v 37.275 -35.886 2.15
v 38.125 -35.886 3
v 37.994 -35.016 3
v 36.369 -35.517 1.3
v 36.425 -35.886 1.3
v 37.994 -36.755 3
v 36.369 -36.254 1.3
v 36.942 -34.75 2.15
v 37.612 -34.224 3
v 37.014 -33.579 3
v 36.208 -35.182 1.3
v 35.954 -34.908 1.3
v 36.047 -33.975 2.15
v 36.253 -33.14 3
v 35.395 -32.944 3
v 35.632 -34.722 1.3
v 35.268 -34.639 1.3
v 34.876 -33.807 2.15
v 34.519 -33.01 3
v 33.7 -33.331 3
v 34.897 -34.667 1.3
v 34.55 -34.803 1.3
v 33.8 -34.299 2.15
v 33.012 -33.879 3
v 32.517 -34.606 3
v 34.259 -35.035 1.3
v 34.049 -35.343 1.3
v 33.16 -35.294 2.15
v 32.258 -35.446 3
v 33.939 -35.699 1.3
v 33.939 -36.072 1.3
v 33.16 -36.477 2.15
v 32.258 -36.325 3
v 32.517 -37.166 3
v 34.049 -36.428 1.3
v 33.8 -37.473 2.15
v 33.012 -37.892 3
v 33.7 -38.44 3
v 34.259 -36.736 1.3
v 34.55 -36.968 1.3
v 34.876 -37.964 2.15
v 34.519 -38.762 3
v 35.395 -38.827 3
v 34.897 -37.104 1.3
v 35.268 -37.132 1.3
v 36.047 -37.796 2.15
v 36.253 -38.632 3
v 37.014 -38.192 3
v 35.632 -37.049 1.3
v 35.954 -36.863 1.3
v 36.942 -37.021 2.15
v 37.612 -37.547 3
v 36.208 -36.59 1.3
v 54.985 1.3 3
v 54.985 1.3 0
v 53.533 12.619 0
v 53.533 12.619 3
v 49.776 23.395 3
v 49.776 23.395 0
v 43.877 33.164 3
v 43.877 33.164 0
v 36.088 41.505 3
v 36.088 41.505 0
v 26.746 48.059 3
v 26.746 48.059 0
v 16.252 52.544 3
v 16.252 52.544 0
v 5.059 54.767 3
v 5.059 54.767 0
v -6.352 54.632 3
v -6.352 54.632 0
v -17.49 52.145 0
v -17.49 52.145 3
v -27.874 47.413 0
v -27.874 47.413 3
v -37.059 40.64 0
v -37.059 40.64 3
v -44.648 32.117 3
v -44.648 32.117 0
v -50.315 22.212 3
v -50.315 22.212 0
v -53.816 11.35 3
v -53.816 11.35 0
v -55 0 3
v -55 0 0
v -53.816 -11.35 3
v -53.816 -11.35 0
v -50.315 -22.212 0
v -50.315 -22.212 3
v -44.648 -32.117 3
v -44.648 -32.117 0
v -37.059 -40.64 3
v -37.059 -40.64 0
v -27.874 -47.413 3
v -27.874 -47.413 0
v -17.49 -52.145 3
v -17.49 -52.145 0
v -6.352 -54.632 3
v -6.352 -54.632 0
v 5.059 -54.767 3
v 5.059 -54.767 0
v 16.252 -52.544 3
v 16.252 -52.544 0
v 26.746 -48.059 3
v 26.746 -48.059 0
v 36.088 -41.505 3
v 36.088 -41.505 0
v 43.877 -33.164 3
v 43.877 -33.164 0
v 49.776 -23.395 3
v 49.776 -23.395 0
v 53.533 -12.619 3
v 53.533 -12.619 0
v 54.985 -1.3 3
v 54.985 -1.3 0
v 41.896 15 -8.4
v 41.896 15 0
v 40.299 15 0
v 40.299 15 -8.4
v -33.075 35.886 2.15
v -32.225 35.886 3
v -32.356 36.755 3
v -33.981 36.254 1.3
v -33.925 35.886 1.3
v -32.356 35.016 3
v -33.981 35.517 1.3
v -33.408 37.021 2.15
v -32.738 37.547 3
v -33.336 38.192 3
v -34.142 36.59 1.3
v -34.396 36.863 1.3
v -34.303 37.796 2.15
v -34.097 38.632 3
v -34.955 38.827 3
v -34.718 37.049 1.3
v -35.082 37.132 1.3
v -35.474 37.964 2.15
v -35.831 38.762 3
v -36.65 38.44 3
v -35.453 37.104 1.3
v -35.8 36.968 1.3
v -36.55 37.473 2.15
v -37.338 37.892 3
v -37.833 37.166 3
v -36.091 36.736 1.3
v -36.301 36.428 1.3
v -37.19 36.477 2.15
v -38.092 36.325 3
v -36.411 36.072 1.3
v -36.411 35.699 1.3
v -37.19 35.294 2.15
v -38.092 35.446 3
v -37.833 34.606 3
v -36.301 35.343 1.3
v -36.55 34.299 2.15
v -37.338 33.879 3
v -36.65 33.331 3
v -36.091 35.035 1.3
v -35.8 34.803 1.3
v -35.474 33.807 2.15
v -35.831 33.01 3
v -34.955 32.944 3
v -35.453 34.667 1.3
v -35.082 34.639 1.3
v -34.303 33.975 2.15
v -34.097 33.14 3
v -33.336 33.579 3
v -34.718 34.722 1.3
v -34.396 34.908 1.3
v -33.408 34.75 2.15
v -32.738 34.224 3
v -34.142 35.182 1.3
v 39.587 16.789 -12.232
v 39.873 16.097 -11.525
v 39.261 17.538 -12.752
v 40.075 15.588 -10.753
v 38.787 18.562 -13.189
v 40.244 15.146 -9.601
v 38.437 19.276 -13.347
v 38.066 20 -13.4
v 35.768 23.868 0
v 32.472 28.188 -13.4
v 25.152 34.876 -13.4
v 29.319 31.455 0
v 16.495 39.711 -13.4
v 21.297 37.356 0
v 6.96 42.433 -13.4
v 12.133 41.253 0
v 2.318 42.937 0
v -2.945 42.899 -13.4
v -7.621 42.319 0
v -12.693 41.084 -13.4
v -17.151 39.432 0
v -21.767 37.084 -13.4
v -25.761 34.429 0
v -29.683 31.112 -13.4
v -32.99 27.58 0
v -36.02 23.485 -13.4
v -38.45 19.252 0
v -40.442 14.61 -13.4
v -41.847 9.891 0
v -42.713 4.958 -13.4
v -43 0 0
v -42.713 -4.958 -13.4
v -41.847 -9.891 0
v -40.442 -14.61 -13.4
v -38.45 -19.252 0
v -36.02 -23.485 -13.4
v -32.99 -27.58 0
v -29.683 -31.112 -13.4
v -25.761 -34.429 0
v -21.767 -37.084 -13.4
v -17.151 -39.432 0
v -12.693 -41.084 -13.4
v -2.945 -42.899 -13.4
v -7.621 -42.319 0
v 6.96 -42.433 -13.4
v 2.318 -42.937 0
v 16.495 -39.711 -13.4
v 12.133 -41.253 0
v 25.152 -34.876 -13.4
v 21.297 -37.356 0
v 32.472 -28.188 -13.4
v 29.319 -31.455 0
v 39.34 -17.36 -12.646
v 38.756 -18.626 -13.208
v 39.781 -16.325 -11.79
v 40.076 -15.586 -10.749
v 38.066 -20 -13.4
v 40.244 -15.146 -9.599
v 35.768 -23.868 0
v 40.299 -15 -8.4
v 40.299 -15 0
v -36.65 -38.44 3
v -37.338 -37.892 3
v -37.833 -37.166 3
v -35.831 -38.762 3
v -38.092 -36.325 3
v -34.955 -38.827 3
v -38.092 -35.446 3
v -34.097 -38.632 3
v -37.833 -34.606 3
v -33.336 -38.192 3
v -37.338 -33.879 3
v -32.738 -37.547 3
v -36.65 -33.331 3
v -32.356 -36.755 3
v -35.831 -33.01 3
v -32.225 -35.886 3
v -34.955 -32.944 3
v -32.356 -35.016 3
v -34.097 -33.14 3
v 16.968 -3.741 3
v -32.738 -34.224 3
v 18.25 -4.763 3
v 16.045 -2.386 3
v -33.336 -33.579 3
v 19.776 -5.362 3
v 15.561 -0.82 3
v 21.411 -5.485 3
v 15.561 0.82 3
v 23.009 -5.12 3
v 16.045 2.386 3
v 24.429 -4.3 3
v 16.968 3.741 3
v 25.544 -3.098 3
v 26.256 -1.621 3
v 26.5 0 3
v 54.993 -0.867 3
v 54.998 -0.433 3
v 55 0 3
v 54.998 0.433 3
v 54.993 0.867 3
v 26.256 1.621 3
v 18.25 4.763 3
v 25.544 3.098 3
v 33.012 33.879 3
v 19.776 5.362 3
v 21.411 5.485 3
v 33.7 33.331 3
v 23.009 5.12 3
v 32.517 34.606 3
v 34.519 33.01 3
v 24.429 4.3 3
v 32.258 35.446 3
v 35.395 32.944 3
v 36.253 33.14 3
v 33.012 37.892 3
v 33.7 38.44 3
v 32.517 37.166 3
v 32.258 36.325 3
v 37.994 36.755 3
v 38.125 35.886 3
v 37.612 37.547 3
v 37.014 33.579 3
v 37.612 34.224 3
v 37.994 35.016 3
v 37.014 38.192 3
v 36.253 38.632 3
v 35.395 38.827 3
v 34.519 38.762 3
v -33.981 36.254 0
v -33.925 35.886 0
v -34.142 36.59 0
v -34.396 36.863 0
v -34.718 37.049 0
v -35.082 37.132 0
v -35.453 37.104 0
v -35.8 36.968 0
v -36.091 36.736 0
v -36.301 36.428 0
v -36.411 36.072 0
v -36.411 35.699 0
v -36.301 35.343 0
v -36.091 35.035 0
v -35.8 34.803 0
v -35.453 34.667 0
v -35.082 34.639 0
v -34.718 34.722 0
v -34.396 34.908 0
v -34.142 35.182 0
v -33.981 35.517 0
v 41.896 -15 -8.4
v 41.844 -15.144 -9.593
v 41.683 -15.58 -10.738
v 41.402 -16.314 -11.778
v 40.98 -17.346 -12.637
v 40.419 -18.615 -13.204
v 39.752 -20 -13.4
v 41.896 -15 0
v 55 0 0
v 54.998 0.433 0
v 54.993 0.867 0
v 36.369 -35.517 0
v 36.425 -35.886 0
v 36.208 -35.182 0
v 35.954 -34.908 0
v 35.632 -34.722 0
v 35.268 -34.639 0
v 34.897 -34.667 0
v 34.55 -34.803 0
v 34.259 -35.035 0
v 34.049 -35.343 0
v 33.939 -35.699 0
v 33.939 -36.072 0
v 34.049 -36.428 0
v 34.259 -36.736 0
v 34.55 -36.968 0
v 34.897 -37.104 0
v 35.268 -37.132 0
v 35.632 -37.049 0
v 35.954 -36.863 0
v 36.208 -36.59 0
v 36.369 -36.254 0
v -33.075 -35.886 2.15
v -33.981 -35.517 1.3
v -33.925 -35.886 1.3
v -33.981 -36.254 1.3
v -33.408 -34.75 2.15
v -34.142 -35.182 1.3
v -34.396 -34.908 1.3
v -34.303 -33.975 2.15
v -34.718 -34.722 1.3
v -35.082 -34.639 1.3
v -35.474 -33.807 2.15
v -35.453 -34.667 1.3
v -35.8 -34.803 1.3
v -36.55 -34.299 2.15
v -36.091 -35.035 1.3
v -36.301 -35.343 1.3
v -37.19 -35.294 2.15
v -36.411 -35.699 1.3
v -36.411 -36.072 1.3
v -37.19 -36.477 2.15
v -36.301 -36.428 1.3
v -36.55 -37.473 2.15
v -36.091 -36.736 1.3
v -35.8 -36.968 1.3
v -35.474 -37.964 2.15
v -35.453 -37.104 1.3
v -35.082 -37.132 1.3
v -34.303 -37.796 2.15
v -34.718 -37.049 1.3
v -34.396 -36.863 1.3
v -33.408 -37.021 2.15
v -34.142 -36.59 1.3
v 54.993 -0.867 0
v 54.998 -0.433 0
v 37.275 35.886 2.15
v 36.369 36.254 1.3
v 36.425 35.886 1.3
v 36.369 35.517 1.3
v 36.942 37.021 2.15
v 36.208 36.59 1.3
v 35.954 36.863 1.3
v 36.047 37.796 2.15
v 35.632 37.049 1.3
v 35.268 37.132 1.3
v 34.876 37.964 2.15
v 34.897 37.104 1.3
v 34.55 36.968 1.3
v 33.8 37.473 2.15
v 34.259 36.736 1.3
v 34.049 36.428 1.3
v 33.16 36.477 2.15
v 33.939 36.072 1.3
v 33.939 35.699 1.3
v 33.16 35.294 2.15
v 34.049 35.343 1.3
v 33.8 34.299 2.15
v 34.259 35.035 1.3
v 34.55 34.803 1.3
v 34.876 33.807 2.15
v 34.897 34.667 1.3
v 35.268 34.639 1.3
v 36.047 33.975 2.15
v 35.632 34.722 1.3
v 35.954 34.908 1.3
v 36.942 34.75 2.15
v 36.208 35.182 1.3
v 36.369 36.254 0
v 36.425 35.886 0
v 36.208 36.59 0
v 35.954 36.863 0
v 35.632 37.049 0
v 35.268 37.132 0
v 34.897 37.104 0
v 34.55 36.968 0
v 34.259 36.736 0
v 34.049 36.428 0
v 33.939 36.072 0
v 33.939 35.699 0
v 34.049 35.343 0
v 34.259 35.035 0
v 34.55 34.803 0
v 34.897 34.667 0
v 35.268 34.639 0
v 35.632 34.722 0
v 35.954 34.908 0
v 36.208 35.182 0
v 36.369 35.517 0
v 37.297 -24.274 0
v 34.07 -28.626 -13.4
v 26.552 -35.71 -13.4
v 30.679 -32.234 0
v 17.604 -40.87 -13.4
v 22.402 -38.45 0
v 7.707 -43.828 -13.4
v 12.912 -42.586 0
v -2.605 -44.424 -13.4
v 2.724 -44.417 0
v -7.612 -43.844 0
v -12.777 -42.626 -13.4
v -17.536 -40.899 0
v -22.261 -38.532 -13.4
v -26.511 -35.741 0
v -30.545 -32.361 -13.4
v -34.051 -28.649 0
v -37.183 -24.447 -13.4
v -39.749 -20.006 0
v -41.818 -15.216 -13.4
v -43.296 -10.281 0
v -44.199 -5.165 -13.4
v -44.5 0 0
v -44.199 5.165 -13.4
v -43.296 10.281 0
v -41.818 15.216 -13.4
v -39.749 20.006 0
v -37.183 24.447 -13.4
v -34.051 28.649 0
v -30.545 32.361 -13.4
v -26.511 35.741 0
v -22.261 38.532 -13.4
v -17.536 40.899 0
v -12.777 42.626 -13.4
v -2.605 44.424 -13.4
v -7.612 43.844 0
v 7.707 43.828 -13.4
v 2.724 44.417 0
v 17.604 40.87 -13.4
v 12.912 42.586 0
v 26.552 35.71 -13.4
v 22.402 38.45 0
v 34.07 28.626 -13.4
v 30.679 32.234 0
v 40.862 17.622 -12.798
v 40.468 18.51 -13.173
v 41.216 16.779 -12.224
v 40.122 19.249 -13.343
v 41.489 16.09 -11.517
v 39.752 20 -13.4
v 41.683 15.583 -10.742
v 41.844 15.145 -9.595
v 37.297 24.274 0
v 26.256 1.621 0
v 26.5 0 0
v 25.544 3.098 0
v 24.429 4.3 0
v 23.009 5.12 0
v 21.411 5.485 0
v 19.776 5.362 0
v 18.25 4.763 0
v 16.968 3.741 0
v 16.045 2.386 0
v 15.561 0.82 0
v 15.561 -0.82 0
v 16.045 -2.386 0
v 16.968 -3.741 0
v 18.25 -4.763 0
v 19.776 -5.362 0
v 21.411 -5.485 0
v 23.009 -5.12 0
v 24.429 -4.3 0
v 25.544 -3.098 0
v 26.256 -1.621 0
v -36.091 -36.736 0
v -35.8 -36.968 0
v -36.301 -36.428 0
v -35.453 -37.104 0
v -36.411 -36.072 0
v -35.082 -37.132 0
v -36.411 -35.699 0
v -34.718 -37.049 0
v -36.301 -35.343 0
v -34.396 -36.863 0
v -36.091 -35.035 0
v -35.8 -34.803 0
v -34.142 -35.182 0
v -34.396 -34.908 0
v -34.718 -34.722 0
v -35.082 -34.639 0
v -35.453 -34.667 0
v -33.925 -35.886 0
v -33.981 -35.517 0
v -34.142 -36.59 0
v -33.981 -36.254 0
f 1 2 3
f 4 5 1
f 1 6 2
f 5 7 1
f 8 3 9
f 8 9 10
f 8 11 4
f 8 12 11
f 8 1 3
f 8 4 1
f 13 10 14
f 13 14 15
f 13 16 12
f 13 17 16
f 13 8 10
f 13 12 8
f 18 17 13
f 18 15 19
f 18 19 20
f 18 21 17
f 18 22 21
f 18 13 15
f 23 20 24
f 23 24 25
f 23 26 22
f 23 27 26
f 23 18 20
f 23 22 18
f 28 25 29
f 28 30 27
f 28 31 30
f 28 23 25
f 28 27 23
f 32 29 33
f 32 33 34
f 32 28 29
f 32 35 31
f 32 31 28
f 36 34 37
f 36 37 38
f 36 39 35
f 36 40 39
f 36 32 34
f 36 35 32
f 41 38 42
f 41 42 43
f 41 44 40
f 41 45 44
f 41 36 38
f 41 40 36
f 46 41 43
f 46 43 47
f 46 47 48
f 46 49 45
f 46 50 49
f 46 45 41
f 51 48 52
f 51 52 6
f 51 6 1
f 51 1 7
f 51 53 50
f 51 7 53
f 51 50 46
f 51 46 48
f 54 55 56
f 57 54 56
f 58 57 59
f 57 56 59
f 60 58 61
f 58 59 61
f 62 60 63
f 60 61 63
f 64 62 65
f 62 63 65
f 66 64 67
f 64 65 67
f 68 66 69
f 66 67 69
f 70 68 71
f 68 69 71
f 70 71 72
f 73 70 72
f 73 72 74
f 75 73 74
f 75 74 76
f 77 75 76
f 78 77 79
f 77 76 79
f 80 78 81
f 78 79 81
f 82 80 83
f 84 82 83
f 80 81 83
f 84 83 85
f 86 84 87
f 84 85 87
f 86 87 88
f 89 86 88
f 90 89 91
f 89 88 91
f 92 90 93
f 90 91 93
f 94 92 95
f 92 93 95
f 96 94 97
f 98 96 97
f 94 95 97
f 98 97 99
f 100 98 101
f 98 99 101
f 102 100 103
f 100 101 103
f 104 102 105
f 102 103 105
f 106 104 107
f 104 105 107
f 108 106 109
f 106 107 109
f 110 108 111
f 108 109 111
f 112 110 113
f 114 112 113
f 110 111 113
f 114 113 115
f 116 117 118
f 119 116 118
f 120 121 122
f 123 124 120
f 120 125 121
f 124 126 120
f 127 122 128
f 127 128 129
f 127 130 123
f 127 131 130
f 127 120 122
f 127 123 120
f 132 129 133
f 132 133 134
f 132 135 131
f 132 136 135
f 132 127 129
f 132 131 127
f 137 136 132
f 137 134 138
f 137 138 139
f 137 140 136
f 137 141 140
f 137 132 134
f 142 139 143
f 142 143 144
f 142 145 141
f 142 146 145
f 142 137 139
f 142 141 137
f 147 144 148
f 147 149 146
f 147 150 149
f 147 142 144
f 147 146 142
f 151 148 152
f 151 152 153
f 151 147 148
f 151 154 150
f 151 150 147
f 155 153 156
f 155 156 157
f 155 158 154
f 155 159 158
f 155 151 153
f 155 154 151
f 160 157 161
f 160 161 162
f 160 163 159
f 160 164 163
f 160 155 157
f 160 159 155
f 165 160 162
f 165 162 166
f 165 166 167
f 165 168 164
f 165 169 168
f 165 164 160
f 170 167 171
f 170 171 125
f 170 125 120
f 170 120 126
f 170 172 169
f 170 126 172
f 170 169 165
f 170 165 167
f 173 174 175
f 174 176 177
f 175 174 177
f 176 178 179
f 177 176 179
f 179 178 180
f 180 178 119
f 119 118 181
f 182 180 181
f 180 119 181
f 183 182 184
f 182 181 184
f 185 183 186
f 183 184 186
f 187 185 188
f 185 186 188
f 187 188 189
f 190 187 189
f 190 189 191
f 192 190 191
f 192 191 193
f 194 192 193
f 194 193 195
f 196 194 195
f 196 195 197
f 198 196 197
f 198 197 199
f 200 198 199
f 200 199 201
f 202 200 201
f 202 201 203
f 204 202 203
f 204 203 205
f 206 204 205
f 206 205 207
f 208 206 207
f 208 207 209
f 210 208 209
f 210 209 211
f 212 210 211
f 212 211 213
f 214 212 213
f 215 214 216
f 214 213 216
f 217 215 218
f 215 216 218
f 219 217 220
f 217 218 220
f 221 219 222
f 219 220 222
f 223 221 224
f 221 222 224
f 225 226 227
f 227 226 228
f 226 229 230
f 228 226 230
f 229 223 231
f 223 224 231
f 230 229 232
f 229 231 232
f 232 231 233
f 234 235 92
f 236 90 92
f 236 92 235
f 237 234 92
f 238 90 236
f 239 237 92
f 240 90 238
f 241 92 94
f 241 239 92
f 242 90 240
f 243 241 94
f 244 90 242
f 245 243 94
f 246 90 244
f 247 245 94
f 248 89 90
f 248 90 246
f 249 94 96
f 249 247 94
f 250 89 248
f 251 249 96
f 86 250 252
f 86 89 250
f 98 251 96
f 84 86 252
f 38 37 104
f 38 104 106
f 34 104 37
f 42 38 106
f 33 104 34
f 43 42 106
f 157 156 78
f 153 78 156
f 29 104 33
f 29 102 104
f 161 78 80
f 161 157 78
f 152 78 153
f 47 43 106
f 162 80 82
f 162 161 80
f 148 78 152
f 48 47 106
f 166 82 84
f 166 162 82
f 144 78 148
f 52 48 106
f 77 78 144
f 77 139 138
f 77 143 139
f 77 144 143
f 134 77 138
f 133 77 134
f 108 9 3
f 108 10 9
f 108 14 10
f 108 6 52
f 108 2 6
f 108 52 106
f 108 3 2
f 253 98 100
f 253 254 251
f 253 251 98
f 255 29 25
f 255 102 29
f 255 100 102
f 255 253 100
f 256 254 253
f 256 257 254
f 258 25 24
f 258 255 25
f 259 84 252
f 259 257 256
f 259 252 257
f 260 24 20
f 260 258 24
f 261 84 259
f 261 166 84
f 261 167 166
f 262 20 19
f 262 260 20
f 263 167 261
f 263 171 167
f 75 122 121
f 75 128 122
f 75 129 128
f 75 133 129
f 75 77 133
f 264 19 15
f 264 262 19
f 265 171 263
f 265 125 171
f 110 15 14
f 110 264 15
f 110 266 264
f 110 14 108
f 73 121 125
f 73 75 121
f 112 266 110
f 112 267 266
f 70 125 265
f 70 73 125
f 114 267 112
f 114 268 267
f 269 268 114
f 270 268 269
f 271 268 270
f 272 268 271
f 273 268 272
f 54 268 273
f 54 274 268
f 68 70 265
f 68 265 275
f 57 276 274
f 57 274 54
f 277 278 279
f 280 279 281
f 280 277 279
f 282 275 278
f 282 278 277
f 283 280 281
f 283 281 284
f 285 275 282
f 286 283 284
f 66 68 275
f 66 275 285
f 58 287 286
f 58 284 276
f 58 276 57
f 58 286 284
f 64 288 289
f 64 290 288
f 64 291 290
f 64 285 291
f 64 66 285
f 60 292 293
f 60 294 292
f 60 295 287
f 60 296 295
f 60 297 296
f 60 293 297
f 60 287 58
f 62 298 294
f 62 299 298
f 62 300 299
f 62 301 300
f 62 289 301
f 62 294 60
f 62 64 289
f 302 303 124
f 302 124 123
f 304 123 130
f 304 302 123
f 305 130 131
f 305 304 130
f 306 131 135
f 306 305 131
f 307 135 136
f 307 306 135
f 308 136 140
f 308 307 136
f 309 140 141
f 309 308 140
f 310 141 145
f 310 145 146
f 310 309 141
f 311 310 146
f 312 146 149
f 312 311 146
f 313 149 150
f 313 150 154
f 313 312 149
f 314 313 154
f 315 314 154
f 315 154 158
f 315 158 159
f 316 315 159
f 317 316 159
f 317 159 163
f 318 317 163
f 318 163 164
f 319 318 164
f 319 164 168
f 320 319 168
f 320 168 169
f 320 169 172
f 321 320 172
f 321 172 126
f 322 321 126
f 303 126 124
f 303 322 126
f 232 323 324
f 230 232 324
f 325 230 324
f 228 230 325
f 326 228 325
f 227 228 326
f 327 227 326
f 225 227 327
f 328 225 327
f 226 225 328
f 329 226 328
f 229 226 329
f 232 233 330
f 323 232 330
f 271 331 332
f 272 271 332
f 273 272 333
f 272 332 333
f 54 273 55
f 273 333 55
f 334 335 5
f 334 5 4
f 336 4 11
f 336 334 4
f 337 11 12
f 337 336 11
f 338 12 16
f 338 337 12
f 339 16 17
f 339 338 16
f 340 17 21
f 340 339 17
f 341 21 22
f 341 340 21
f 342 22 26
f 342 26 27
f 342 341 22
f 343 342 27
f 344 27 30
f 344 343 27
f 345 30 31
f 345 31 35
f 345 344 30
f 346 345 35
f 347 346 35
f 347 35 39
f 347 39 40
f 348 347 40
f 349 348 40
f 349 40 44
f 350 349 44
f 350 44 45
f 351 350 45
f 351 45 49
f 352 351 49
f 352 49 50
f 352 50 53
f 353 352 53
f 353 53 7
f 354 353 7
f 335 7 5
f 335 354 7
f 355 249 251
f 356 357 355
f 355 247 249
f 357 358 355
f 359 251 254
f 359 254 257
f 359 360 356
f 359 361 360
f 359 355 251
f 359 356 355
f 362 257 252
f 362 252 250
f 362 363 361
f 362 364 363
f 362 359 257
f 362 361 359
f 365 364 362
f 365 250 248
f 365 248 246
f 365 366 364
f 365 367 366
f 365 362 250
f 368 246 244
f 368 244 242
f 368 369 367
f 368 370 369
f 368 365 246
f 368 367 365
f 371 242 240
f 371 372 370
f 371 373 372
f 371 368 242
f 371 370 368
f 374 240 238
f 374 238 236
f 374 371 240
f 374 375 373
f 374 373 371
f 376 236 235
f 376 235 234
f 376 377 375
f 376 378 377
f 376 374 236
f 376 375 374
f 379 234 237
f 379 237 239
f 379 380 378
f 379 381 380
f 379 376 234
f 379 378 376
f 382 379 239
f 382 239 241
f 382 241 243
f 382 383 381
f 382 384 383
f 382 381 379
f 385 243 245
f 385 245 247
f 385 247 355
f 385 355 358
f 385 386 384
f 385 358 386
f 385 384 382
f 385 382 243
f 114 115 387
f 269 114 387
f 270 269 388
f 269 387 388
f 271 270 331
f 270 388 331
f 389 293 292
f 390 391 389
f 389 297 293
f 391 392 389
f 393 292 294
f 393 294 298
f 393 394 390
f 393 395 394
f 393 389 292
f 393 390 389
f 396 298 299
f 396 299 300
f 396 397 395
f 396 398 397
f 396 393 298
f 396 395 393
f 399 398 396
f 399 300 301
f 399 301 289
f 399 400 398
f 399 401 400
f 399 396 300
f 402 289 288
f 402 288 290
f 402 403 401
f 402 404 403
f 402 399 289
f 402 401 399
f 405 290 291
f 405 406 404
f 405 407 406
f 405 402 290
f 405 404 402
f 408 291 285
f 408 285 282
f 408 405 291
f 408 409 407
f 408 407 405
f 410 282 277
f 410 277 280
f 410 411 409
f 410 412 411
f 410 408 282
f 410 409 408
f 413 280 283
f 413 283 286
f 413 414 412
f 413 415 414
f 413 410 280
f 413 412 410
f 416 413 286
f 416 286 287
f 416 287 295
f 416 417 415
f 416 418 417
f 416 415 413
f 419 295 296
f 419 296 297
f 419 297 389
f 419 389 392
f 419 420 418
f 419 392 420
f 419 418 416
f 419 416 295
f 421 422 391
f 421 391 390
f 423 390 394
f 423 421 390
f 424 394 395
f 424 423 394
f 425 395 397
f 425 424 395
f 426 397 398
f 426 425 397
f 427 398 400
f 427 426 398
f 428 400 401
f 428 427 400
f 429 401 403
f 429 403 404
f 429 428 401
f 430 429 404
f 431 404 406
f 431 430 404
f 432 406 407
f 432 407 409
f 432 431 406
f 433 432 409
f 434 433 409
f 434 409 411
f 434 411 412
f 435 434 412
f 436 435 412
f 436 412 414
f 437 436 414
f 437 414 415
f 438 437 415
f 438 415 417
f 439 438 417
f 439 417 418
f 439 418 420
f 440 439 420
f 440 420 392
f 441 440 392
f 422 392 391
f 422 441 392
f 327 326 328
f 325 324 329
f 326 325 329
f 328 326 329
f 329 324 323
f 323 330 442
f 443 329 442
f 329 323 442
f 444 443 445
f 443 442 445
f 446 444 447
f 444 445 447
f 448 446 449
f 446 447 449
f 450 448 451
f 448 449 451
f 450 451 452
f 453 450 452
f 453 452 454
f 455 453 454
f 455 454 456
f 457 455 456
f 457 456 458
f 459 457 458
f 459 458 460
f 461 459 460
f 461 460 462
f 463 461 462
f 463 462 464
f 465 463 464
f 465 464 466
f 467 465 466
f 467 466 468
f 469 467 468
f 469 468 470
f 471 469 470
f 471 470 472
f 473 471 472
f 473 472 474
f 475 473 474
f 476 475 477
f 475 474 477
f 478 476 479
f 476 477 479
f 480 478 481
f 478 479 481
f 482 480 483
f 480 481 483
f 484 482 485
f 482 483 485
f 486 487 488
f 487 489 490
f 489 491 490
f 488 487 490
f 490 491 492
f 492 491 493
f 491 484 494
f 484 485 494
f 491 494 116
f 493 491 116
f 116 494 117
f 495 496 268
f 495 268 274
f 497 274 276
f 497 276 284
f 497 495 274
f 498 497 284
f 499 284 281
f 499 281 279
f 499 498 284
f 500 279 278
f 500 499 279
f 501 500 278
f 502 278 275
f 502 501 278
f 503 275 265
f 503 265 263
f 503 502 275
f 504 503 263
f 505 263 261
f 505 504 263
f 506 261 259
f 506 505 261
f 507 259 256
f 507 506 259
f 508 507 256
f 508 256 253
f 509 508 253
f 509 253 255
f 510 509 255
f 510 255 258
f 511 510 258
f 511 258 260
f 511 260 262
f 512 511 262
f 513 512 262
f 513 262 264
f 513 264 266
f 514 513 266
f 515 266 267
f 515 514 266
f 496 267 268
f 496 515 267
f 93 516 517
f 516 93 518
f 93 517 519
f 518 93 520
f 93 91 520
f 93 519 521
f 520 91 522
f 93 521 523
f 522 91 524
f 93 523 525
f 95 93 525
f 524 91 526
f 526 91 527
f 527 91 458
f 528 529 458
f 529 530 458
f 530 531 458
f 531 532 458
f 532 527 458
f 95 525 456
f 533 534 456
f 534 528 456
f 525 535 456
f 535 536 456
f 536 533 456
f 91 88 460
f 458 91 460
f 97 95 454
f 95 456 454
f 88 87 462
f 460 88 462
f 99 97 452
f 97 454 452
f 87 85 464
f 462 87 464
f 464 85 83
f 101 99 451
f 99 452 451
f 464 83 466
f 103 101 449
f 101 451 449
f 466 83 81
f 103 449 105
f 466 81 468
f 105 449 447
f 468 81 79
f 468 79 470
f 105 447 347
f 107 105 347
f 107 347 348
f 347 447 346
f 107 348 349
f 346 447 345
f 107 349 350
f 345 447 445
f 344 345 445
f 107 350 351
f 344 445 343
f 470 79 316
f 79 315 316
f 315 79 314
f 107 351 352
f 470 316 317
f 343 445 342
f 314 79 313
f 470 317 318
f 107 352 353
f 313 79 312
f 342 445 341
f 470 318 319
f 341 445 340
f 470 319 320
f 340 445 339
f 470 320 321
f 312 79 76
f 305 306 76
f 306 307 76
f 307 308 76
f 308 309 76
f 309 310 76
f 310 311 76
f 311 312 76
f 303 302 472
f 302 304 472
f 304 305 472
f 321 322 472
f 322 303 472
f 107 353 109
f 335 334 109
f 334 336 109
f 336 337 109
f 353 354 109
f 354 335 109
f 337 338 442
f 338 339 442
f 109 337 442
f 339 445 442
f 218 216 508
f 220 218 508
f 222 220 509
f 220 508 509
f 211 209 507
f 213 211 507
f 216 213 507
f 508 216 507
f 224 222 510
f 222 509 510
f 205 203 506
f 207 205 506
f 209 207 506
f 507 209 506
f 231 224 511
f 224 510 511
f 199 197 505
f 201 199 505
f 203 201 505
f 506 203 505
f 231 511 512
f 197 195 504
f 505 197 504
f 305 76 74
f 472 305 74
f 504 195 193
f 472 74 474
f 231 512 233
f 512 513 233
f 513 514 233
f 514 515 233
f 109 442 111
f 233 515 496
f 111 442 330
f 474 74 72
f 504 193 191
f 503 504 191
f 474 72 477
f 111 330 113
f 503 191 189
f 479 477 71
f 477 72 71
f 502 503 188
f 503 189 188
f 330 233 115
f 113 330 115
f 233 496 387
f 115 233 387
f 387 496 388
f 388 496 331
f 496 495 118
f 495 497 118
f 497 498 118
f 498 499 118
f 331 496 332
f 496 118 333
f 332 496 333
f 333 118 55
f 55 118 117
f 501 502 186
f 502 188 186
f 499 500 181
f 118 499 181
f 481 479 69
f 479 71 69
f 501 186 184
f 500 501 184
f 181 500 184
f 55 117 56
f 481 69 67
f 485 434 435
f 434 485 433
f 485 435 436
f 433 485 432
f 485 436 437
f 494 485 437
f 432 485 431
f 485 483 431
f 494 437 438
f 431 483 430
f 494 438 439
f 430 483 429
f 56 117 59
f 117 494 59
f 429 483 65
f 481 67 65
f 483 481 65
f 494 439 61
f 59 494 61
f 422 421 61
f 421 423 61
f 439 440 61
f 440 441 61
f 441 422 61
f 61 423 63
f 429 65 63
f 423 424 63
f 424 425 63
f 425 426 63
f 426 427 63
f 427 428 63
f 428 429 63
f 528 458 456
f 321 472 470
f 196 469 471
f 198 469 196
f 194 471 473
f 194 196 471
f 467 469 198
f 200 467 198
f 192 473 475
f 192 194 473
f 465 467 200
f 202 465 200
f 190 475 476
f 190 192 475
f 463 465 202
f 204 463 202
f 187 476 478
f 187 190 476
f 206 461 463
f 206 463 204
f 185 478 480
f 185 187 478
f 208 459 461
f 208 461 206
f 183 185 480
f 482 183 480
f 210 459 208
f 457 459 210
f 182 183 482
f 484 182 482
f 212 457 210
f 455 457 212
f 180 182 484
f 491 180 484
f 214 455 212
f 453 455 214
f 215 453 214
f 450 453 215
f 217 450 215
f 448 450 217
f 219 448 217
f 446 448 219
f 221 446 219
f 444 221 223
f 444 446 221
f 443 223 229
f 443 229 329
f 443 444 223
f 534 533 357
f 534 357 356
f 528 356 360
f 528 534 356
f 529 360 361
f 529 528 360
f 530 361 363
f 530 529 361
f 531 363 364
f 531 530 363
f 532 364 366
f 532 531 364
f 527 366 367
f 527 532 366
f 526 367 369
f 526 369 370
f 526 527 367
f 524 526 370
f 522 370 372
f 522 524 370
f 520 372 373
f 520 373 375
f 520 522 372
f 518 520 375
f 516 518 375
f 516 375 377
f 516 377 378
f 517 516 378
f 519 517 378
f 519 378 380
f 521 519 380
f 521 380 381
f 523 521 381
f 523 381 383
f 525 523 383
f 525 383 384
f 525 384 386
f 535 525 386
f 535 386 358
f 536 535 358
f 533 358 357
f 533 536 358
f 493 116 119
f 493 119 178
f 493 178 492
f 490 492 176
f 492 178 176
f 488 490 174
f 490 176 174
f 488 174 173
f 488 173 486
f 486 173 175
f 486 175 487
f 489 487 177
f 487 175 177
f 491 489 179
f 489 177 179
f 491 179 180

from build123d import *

# Parameters (mm, degrees)
F0_R        = 1.25
F0_R_2      = 5.5
F1_DEPTH    = 3
F3_DEPTH    = 13.4
F4_T1_DEPTH = 26.5968204778
F5_SIZE     = 1.7


# Not quite as in the source:
# - a fillet or chamfer that OpenCascade refuses, or shapes differently, is made with other operations: its cross-section is extruded or revolved along the edge and cut away or added
# - a feature names something its author has since deleted; it is built from what else it names


with BuildPart() as f1:
    # F0 (on Top) → F1 (new body)
    with BuildSketch(Plane.XY):
        with BuildLine():
            ThreePointArc((45.3208194724, 4.0340206186), (-45.5, 0), (45.3208194724, -4.0340206186))
            ThreePointArc((45.3208194724, -4.0340206186), (46.2839051451, -2.086638513), (48.3090053717, -1.3))
            Line((48.3090053717, -1.3), (54.9846342172, -1.3))
            ThreePointArc((54.9846342172, -1.3), (54.9961584201, -0.6500454037), (55, 0))
            ThreePointArc((55, 0), (54.9961584201, 0.6500454037), (54.9846342172, 1.3))
            Line((54.9846342172, 1.3), (48.3090053717, 1.3))
            ThreePointArc((48.3090053717, 1.3), (46.2839051451, 2.086638513), (45.3208194724, 4.0340206186))
        make_face()
        with BuildLine():
            Line((39.2652518138, 1.3), (32, 1.3))
            Line((32, 1.3), (32, 0))
            Line((32, 0), (32, -1.3))
            Line((32, -1.3), (39.2652518138, -1.3))
            ThreePointArc((39.2652518138, -1.3), (41.499054271, -2.2974699547), (42.2474228376, -4.6265822785))
            ThreePointArc((42.2474228376, -4.6265822785), (-42.5, 0), (42.2474228376, 4.6265822785))
            ThreePointArc((42.2474228376, 4.6265822785), (41.499054271, 2.2974699547), (39.2652518138, 1.3))
        make_face(mode=Mode.SUBTRACT)
        with BuildLine():
            Line((32, 15), (32, 1.3))
            Line((32, 1.3), (39.2652518138, 1.3))
            ThreePointArc((39.2652518138, 1.3), (41.499054271, 2.2974699547), (42.2474228376, 4.6265822785))
            ThreePointArc((42.2474228376, 4.6265822785), (-42.5, 0), (42.2474228376, -4.6265822785))
            ThreePointArc((42.2474228376, -4.6265822785), (41.499054271, -2.2974699547), (39.2652518138, -1.3))
            Line((39.2652518138, -1.3), (32, -1.3))
            Line((32, -1.3), (32, -15))
            Line((32, -15), (21.575, -15))
            Line((21.575, -15), (21.575, -17.3))
            ThreePointArc((21.575, -17.3), (17.075, -21.8), (12.575, -17.3))
            Line((12.575, -17.3), (12.575, -15))
            Line((12.575, -15), (-12.575, -15))
            Line((-12.575, -15), (-12.575, -17.3))
            ThreePointArc((-12.575, -17.3), (-17.075, -21.8), (-21.575, -17.3))
            Line((-21.575, -17.3), (-21.575, -15))
            Line((-21.575, -15), (-32, -15))
            Line((-32, -15), (-32, 15))
            Line((-32, 15), (-21.575, 15))
            Line((-21.575, 15), (-21.575, 17.3))
            ThreePointArc((-21.575, 17.3), (-17.075, 21.8), (-12.575, 17.3))
            Line((-12.575, 17.3), (-12.575, 15))
            Line((-12.575, 15), (12.575, 15))
            Line((12.575, 15), (12.575, 17.3))
            ThreePointArc((12.575, 17.3), (17.075, 21.8), (21.575, 17.3))
            Line((21.575, 17.3), (21.575, 15))
            Line((21.575, 15), (32, 15))
        make_face()
        with BuildLine():
            ThreePointArc((48.3090053717, -1.3), (46.2839051451, -2.086638513), (45.3208194724, -4.0340206186))
            ThreePointArc((45.3208194724, -4.0340206186), (-45.5, 0), (45.3208194724, 4.0340206186))
            ThreePointArc((45.3208194724, 4.0340206186), (46.2839051451, 2.086638513), (48.3090053717, 1.3))
            Line((48.3090053717, 1.3), (54.9846342172, 1.3))
            ThreePointArc((54.9846342172, 1.3), (-55, 0), (54.9846342172, -1.3))
            Line((54.9846342172, -1.3), (48.3090053717, -1.3))
        make_face()
        with Locations((-35.175, -35.8856778534)):
            Circle(F0_R, mode=Mode.SUBTRACT)
        with Locations((35.175, -35.8856778534)):
            Circle(F0_R, mode=Mode.SUBTRACT)
        with Locations((-35.175, 35.8856778534)):
            Circle(F0_R, mode=Mode.SUBTRACT)
        with Locations((35.175, 35.8856778534)):
            Circle(F0_R, mode=Mode.SUBTRACT)
        with BuildLine():
            Line((32, 0), (32, 1.3))
            Line((32, 1.3), (32, 15))
            Line((32, 15), (21.575, 15))
            Line((21.575, 15), (21.575, 17.3))
            ThreePointArc((21.575, 17.3), (17.075, 21.8), (12.575, 17.3))
            Line((12.575, 17.3), (12.575, 15))
            Line((12.575, 15), (-12.575, 15))
            Line((-12.575, 15), (-12.575, 17.3))
            ThreePointArc((-12.575, 17.3), (-17.075, 21.8), (-21.575, 17.3))
            Line((-21.575, 17.3), (-21.575, 15))
            Line((-21.575, 15), (-32, 15))
            Line((-32, 15), (-32, -15))
            Line((-32, -15), (-21.575, -15))
            Line((-21.575, -15), (-21.575, -17.3))
            ThreePointArc((-21.575, -17.3), (-17.075, -21.8), (-12.575, -17.3))
            Line((-12.575, -17.3), (-12.575, -15))
            Line((-12.575, -15), (12.575, -15))
            Line((12.575, -15), (12.575, -17.3))
            ThreePointArc((12.575, -17.3), (17.075, -21.8), (21.575, -17.3))
            Line((21.575, -17.3), (21.575, -15))
            Line((21.575, -15), (32, -15))
            Line((32, -15), (32, -1.3))
            Line((32, -1.3), (32, 0))
        make_face()
        with Locations((21, 0)):
            Circle(F0_R_2, mode=Mode.SUBTRACT)
    extrude(amount=F1_DEPTH)

    # F2 (on face) → F3 (join)
    with BuildSketch(Plane(origin=(0, 0, 0), x_dir=(1, 0, 0), z_dir=(0, 0, -1))):
        with BuildLine():
            Line((40.2988833592, 15), (41.895703837, 15))
            ThreePointArc((41.895703837, 15), (-44.5, 0), (41.895703837, -15))
            Line((41.895703837, -15), (40.2988833592, -15))
            ThreePointArc((40.2988833592, -15), (-43, 0), (40.2988833592, 15))
        make_face()
    extrude(amount=F3_DEPTH)

    # F4: fillet of radius 5 on 2 edges, made by hand

    # F4_s2 → F4_t1 (cut)
    with BuildSketch(Plane.YZ.offset(27.7988833592)):
        with BuildLine():
            ThreePointArc((-15, -8.4), (-16.4644660941, -11.9355339059), (-20, -13.4))
            Line((-20, -13.4), (-15, -13.4))
            Line((-15, -13.4), (-15, -8.4))
        make_face()
        with BuildLine():
            ThreePointArc((15, -8.4), (16.4644660941, -11.9355339059), (20, -13.4))
            Line((20, -13.4), (15, -13.4))
            Line((15, -13.4), (15, -8.4))
        make_face()
    extrude(amount=F4_T1_DEPTH, mode=Mode.SUBTRACT)

    # F5
    f5_edges = [f1.edges().sort_by_distance(p)[0] for p in [
        (-36.425, 35.885678, 3),
        (-36.425, -35.885678, 3),
        (33.925, -35.885678, 3),
        (33.925, 35.885678, 3),
    ]]
    chamfer(f5_edges, length=F5_SIZE)


solid = f1.part
